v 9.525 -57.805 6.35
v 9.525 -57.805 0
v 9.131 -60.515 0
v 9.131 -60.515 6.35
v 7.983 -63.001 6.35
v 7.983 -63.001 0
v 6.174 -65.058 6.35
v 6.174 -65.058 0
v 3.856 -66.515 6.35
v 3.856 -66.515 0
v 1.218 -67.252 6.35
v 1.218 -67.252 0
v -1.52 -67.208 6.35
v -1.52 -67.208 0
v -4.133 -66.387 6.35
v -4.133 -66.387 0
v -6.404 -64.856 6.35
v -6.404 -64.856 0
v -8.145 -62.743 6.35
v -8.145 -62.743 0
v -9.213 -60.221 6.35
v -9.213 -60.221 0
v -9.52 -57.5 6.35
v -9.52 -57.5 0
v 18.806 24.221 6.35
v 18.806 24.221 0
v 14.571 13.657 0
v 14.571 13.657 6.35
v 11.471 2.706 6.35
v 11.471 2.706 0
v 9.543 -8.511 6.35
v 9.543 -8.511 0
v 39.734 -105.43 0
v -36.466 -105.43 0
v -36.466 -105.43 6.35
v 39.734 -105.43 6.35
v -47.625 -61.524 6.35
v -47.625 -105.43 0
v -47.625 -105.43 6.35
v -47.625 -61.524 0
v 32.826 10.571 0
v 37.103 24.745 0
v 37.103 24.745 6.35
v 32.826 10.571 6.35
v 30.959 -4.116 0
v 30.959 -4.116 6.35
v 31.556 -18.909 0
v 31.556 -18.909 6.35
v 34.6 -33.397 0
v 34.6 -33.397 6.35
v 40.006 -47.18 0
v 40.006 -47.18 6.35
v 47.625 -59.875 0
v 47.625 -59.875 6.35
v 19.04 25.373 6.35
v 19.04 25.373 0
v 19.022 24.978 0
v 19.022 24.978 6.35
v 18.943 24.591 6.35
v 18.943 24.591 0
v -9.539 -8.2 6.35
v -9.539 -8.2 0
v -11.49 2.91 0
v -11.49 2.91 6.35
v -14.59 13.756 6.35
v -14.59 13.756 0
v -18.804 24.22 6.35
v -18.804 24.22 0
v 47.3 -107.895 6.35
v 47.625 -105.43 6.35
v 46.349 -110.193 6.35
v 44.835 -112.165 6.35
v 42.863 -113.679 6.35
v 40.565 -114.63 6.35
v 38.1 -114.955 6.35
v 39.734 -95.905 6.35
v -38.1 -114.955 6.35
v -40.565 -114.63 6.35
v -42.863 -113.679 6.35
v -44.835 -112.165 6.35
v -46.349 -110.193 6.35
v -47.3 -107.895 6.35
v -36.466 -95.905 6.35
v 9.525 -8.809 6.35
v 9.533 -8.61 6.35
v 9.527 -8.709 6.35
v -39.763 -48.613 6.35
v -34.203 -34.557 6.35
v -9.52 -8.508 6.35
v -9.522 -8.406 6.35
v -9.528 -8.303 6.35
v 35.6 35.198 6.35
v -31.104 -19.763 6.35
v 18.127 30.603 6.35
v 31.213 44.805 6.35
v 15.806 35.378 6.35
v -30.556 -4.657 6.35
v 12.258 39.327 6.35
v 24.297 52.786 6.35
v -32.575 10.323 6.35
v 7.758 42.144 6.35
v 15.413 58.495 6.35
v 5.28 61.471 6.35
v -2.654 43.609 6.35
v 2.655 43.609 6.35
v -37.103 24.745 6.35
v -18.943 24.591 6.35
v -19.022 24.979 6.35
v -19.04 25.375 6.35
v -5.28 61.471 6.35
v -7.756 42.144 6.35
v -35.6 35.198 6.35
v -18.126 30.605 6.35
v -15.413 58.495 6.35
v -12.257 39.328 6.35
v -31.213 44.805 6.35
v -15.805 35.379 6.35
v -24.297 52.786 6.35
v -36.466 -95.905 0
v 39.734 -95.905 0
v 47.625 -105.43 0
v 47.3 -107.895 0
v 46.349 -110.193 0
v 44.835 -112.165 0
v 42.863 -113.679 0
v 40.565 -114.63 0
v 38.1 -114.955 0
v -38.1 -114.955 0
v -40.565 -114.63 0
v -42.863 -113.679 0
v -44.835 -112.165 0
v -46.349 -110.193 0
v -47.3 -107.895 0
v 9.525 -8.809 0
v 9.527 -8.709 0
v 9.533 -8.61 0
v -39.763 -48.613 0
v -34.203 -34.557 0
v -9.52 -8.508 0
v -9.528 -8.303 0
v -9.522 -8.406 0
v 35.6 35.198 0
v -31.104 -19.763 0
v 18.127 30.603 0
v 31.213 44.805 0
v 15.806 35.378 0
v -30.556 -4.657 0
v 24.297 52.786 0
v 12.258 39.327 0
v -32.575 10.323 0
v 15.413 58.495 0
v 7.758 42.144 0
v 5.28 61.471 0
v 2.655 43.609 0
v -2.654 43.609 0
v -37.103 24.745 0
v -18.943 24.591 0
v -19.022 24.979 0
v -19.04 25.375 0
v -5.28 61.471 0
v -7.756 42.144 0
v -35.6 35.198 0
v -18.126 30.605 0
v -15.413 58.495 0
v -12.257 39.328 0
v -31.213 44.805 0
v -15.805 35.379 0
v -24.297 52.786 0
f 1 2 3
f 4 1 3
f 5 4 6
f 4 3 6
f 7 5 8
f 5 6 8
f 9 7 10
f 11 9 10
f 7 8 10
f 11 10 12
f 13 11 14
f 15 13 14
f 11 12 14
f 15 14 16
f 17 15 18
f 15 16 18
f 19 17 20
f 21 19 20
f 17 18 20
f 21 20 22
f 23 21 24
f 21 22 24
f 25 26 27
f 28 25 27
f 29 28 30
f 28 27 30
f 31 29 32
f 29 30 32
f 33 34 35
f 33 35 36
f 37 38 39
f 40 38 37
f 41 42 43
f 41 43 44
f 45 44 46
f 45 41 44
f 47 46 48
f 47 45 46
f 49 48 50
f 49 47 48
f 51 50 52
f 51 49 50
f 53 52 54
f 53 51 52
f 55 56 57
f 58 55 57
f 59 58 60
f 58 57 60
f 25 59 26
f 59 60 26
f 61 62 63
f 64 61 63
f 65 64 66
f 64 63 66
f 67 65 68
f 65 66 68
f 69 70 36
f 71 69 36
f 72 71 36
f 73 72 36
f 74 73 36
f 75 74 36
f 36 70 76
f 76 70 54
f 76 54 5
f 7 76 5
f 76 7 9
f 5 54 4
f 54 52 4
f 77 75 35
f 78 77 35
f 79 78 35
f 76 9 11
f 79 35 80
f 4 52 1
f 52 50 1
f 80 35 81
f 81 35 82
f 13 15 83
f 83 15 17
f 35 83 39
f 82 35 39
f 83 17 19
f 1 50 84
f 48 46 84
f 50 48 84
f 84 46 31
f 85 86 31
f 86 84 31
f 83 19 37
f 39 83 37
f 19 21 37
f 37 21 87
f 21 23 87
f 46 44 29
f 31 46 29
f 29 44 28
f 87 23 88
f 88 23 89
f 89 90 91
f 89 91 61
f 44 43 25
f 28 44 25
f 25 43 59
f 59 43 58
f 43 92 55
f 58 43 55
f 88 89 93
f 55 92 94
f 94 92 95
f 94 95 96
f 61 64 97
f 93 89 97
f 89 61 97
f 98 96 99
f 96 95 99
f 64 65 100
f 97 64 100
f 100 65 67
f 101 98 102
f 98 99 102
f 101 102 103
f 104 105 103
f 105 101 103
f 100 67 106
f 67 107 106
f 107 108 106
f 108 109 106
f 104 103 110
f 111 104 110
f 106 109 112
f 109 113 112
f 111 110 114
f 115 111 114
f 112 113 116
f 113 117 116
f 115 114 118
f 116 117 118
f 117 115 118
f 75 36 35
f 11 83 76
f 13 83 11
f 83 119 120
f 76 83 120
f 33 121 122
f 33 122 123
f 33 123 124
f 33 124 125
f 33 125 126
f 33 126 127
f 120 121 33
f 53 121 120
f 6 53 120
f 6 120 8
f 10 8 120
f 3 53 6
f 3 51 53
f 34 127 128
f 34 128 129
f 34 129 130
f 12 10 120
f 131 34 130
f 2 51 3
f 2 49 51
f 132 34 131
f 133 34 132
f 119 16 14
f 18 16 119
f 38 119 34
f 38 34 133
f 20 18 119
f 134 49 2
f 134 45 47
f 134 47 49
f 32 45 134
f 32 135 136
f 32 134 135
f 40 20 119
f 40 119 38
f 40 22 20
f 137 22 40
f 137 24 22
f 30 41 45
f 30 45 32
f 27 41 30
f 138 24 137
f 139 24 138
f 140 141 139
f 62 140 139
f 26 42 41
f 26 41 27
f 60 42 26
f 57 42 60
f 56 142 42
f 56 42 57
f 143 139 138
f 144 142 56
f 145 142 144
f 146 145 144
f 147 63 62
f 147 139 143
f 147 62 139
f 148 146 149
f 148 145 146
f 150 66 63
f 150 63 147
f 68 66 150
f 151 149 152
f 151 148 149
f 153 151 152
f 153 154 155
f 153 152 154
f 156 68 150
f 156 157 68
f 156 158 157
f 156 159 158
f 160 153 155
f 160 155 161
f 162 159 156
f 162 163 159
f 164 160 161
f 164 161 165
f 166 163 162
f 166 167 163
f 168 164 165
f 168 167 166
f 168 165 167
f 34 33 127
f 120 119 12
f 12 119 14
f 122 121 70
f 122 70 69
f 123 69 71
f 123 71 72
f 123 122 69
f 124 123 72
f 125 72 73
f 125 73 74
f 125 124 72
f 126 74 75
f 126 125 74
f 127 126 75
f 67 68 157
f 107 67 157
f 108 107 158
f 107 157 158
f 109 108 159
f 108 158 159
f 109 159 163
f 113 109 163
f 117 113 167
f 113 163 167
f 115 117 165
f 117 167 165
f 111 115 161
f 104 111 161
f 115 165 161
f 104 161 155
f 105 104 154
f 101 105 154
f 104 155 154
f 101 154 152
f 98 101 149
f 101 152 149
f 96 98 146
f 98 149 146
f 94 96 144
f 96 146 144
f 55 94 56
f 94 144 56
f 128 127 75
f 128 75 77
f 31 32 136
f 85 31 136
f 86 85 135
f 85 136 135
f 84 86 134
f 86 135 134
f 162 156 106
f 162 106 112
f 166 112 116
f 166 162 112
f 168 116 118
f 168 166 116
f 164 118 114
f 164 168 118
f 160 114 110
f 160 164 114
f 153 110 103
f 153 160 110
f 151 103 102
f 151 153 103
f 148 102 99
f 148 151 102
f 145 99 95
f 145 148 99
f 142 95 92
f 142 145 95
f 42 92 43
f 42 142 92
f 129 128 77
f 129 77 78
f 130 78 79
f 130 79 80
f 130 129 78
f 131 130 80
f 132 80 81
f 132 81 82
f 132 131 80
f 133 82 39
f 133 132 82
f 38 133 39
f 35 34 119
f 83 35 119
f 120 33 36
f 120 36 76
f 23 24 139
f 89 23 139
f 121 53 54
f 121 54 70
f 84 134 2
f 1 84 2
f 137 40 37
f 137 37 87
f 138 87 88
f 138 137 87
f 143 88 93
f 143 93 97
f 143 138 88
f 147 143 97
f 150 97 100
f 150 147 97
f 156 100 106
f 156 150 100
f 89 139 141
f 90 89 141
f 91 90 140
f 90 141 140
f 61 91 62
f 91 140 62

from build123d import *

# Parameters (mm, degrees)
SKETCH1_W      = 76.2
SKETCH1_H      = 9.525
EXTRUDE1_DEPTH = 6.35


with BuildPart() as part:
    # Sketch1 → Extrude1 (new body)
    with BuildSketch(Plane.XY):
        with BuildLine():
            Line((47.625, -59.874659688), (47.625, -105.430018939))
            ThreePointArc((47.625, -105.430018939), (44.835192091, -112.16521103), (38.1, -114.955018939))
            Line((38.1, -114.955018939), (-38.1, -114.955018939))
            ThreePointArc((-38.1, -114.955018939), (-44.835192091, -112.16521103), (-47.625, -105.430018939))
            Line((-47.625, -105.430018939), (-47.625, -61.523712718))
            ThreePointArc((-47.625, -61.523712718), (-31.103765958, -19.76273177), (-37.103282828, 24.744981061))
            ThreePointArc((-37.103282828, 24.744981061), (0, 61.848263889), (37.103282828, 24.744981061))
            ThreePointArc((37.103282828, 24.744981061), (31.556422492, -18.908685267), (47.625, -59.874659688))
        make_face()
        with BuildLine():
            Line((-9.520105929, -57.499718912), (-9.520105929, -8.508405033))
            ThreePointArc((-9.520105929, -8.508405033), (-9.524795338, -8.354131878), (-9.538846249, -8.200428368))
            ThreePointArc((-9.538846249, -8.200428368), (-12.897895618, 8.373789137), (-18.804224779, 24.220024477))
            ThreePointArc((-18.804224779, 24.220024477), (-18.98980734, 24.783579345), (-19.039585391, 25.374812905))
            ThreePointArc((-19.039585391, 25.374812905), (0.000886222, 43.79498104), (19.039643909, 25.373041427))
            ThreePointArc((19.039643909, 25.373041427), (18.990133662, 24.783398196), (18.805538674, 24.221210421))
            ThreePointArc((18.805538674, 24.221210421), (12.876614575, 8.222405207), (9.542532972, -8.510729859))
            ThreePointArc((9.542532972, -8.510729859), (9.529387032, -8.65943529), (9.525, -8.808656182))
            Line((9.525, -8.808656182), (9.525, -57.805018939))
            ThreePointArc((9.525, -57.805018939), (-0.152669626, -67.328795343), (-9.520105929, -57.499718912))
        make_face(mode=Mode.SUBTRACT)
        with Locations((1.633712121, -100.667518939)):
            Rectangle(SKETCH1_W, SKETCH1_H, mode=Mode.SUBTRACT)
    extrude(amount=EXTRUDE1_DEPTH)


solid = part.part
